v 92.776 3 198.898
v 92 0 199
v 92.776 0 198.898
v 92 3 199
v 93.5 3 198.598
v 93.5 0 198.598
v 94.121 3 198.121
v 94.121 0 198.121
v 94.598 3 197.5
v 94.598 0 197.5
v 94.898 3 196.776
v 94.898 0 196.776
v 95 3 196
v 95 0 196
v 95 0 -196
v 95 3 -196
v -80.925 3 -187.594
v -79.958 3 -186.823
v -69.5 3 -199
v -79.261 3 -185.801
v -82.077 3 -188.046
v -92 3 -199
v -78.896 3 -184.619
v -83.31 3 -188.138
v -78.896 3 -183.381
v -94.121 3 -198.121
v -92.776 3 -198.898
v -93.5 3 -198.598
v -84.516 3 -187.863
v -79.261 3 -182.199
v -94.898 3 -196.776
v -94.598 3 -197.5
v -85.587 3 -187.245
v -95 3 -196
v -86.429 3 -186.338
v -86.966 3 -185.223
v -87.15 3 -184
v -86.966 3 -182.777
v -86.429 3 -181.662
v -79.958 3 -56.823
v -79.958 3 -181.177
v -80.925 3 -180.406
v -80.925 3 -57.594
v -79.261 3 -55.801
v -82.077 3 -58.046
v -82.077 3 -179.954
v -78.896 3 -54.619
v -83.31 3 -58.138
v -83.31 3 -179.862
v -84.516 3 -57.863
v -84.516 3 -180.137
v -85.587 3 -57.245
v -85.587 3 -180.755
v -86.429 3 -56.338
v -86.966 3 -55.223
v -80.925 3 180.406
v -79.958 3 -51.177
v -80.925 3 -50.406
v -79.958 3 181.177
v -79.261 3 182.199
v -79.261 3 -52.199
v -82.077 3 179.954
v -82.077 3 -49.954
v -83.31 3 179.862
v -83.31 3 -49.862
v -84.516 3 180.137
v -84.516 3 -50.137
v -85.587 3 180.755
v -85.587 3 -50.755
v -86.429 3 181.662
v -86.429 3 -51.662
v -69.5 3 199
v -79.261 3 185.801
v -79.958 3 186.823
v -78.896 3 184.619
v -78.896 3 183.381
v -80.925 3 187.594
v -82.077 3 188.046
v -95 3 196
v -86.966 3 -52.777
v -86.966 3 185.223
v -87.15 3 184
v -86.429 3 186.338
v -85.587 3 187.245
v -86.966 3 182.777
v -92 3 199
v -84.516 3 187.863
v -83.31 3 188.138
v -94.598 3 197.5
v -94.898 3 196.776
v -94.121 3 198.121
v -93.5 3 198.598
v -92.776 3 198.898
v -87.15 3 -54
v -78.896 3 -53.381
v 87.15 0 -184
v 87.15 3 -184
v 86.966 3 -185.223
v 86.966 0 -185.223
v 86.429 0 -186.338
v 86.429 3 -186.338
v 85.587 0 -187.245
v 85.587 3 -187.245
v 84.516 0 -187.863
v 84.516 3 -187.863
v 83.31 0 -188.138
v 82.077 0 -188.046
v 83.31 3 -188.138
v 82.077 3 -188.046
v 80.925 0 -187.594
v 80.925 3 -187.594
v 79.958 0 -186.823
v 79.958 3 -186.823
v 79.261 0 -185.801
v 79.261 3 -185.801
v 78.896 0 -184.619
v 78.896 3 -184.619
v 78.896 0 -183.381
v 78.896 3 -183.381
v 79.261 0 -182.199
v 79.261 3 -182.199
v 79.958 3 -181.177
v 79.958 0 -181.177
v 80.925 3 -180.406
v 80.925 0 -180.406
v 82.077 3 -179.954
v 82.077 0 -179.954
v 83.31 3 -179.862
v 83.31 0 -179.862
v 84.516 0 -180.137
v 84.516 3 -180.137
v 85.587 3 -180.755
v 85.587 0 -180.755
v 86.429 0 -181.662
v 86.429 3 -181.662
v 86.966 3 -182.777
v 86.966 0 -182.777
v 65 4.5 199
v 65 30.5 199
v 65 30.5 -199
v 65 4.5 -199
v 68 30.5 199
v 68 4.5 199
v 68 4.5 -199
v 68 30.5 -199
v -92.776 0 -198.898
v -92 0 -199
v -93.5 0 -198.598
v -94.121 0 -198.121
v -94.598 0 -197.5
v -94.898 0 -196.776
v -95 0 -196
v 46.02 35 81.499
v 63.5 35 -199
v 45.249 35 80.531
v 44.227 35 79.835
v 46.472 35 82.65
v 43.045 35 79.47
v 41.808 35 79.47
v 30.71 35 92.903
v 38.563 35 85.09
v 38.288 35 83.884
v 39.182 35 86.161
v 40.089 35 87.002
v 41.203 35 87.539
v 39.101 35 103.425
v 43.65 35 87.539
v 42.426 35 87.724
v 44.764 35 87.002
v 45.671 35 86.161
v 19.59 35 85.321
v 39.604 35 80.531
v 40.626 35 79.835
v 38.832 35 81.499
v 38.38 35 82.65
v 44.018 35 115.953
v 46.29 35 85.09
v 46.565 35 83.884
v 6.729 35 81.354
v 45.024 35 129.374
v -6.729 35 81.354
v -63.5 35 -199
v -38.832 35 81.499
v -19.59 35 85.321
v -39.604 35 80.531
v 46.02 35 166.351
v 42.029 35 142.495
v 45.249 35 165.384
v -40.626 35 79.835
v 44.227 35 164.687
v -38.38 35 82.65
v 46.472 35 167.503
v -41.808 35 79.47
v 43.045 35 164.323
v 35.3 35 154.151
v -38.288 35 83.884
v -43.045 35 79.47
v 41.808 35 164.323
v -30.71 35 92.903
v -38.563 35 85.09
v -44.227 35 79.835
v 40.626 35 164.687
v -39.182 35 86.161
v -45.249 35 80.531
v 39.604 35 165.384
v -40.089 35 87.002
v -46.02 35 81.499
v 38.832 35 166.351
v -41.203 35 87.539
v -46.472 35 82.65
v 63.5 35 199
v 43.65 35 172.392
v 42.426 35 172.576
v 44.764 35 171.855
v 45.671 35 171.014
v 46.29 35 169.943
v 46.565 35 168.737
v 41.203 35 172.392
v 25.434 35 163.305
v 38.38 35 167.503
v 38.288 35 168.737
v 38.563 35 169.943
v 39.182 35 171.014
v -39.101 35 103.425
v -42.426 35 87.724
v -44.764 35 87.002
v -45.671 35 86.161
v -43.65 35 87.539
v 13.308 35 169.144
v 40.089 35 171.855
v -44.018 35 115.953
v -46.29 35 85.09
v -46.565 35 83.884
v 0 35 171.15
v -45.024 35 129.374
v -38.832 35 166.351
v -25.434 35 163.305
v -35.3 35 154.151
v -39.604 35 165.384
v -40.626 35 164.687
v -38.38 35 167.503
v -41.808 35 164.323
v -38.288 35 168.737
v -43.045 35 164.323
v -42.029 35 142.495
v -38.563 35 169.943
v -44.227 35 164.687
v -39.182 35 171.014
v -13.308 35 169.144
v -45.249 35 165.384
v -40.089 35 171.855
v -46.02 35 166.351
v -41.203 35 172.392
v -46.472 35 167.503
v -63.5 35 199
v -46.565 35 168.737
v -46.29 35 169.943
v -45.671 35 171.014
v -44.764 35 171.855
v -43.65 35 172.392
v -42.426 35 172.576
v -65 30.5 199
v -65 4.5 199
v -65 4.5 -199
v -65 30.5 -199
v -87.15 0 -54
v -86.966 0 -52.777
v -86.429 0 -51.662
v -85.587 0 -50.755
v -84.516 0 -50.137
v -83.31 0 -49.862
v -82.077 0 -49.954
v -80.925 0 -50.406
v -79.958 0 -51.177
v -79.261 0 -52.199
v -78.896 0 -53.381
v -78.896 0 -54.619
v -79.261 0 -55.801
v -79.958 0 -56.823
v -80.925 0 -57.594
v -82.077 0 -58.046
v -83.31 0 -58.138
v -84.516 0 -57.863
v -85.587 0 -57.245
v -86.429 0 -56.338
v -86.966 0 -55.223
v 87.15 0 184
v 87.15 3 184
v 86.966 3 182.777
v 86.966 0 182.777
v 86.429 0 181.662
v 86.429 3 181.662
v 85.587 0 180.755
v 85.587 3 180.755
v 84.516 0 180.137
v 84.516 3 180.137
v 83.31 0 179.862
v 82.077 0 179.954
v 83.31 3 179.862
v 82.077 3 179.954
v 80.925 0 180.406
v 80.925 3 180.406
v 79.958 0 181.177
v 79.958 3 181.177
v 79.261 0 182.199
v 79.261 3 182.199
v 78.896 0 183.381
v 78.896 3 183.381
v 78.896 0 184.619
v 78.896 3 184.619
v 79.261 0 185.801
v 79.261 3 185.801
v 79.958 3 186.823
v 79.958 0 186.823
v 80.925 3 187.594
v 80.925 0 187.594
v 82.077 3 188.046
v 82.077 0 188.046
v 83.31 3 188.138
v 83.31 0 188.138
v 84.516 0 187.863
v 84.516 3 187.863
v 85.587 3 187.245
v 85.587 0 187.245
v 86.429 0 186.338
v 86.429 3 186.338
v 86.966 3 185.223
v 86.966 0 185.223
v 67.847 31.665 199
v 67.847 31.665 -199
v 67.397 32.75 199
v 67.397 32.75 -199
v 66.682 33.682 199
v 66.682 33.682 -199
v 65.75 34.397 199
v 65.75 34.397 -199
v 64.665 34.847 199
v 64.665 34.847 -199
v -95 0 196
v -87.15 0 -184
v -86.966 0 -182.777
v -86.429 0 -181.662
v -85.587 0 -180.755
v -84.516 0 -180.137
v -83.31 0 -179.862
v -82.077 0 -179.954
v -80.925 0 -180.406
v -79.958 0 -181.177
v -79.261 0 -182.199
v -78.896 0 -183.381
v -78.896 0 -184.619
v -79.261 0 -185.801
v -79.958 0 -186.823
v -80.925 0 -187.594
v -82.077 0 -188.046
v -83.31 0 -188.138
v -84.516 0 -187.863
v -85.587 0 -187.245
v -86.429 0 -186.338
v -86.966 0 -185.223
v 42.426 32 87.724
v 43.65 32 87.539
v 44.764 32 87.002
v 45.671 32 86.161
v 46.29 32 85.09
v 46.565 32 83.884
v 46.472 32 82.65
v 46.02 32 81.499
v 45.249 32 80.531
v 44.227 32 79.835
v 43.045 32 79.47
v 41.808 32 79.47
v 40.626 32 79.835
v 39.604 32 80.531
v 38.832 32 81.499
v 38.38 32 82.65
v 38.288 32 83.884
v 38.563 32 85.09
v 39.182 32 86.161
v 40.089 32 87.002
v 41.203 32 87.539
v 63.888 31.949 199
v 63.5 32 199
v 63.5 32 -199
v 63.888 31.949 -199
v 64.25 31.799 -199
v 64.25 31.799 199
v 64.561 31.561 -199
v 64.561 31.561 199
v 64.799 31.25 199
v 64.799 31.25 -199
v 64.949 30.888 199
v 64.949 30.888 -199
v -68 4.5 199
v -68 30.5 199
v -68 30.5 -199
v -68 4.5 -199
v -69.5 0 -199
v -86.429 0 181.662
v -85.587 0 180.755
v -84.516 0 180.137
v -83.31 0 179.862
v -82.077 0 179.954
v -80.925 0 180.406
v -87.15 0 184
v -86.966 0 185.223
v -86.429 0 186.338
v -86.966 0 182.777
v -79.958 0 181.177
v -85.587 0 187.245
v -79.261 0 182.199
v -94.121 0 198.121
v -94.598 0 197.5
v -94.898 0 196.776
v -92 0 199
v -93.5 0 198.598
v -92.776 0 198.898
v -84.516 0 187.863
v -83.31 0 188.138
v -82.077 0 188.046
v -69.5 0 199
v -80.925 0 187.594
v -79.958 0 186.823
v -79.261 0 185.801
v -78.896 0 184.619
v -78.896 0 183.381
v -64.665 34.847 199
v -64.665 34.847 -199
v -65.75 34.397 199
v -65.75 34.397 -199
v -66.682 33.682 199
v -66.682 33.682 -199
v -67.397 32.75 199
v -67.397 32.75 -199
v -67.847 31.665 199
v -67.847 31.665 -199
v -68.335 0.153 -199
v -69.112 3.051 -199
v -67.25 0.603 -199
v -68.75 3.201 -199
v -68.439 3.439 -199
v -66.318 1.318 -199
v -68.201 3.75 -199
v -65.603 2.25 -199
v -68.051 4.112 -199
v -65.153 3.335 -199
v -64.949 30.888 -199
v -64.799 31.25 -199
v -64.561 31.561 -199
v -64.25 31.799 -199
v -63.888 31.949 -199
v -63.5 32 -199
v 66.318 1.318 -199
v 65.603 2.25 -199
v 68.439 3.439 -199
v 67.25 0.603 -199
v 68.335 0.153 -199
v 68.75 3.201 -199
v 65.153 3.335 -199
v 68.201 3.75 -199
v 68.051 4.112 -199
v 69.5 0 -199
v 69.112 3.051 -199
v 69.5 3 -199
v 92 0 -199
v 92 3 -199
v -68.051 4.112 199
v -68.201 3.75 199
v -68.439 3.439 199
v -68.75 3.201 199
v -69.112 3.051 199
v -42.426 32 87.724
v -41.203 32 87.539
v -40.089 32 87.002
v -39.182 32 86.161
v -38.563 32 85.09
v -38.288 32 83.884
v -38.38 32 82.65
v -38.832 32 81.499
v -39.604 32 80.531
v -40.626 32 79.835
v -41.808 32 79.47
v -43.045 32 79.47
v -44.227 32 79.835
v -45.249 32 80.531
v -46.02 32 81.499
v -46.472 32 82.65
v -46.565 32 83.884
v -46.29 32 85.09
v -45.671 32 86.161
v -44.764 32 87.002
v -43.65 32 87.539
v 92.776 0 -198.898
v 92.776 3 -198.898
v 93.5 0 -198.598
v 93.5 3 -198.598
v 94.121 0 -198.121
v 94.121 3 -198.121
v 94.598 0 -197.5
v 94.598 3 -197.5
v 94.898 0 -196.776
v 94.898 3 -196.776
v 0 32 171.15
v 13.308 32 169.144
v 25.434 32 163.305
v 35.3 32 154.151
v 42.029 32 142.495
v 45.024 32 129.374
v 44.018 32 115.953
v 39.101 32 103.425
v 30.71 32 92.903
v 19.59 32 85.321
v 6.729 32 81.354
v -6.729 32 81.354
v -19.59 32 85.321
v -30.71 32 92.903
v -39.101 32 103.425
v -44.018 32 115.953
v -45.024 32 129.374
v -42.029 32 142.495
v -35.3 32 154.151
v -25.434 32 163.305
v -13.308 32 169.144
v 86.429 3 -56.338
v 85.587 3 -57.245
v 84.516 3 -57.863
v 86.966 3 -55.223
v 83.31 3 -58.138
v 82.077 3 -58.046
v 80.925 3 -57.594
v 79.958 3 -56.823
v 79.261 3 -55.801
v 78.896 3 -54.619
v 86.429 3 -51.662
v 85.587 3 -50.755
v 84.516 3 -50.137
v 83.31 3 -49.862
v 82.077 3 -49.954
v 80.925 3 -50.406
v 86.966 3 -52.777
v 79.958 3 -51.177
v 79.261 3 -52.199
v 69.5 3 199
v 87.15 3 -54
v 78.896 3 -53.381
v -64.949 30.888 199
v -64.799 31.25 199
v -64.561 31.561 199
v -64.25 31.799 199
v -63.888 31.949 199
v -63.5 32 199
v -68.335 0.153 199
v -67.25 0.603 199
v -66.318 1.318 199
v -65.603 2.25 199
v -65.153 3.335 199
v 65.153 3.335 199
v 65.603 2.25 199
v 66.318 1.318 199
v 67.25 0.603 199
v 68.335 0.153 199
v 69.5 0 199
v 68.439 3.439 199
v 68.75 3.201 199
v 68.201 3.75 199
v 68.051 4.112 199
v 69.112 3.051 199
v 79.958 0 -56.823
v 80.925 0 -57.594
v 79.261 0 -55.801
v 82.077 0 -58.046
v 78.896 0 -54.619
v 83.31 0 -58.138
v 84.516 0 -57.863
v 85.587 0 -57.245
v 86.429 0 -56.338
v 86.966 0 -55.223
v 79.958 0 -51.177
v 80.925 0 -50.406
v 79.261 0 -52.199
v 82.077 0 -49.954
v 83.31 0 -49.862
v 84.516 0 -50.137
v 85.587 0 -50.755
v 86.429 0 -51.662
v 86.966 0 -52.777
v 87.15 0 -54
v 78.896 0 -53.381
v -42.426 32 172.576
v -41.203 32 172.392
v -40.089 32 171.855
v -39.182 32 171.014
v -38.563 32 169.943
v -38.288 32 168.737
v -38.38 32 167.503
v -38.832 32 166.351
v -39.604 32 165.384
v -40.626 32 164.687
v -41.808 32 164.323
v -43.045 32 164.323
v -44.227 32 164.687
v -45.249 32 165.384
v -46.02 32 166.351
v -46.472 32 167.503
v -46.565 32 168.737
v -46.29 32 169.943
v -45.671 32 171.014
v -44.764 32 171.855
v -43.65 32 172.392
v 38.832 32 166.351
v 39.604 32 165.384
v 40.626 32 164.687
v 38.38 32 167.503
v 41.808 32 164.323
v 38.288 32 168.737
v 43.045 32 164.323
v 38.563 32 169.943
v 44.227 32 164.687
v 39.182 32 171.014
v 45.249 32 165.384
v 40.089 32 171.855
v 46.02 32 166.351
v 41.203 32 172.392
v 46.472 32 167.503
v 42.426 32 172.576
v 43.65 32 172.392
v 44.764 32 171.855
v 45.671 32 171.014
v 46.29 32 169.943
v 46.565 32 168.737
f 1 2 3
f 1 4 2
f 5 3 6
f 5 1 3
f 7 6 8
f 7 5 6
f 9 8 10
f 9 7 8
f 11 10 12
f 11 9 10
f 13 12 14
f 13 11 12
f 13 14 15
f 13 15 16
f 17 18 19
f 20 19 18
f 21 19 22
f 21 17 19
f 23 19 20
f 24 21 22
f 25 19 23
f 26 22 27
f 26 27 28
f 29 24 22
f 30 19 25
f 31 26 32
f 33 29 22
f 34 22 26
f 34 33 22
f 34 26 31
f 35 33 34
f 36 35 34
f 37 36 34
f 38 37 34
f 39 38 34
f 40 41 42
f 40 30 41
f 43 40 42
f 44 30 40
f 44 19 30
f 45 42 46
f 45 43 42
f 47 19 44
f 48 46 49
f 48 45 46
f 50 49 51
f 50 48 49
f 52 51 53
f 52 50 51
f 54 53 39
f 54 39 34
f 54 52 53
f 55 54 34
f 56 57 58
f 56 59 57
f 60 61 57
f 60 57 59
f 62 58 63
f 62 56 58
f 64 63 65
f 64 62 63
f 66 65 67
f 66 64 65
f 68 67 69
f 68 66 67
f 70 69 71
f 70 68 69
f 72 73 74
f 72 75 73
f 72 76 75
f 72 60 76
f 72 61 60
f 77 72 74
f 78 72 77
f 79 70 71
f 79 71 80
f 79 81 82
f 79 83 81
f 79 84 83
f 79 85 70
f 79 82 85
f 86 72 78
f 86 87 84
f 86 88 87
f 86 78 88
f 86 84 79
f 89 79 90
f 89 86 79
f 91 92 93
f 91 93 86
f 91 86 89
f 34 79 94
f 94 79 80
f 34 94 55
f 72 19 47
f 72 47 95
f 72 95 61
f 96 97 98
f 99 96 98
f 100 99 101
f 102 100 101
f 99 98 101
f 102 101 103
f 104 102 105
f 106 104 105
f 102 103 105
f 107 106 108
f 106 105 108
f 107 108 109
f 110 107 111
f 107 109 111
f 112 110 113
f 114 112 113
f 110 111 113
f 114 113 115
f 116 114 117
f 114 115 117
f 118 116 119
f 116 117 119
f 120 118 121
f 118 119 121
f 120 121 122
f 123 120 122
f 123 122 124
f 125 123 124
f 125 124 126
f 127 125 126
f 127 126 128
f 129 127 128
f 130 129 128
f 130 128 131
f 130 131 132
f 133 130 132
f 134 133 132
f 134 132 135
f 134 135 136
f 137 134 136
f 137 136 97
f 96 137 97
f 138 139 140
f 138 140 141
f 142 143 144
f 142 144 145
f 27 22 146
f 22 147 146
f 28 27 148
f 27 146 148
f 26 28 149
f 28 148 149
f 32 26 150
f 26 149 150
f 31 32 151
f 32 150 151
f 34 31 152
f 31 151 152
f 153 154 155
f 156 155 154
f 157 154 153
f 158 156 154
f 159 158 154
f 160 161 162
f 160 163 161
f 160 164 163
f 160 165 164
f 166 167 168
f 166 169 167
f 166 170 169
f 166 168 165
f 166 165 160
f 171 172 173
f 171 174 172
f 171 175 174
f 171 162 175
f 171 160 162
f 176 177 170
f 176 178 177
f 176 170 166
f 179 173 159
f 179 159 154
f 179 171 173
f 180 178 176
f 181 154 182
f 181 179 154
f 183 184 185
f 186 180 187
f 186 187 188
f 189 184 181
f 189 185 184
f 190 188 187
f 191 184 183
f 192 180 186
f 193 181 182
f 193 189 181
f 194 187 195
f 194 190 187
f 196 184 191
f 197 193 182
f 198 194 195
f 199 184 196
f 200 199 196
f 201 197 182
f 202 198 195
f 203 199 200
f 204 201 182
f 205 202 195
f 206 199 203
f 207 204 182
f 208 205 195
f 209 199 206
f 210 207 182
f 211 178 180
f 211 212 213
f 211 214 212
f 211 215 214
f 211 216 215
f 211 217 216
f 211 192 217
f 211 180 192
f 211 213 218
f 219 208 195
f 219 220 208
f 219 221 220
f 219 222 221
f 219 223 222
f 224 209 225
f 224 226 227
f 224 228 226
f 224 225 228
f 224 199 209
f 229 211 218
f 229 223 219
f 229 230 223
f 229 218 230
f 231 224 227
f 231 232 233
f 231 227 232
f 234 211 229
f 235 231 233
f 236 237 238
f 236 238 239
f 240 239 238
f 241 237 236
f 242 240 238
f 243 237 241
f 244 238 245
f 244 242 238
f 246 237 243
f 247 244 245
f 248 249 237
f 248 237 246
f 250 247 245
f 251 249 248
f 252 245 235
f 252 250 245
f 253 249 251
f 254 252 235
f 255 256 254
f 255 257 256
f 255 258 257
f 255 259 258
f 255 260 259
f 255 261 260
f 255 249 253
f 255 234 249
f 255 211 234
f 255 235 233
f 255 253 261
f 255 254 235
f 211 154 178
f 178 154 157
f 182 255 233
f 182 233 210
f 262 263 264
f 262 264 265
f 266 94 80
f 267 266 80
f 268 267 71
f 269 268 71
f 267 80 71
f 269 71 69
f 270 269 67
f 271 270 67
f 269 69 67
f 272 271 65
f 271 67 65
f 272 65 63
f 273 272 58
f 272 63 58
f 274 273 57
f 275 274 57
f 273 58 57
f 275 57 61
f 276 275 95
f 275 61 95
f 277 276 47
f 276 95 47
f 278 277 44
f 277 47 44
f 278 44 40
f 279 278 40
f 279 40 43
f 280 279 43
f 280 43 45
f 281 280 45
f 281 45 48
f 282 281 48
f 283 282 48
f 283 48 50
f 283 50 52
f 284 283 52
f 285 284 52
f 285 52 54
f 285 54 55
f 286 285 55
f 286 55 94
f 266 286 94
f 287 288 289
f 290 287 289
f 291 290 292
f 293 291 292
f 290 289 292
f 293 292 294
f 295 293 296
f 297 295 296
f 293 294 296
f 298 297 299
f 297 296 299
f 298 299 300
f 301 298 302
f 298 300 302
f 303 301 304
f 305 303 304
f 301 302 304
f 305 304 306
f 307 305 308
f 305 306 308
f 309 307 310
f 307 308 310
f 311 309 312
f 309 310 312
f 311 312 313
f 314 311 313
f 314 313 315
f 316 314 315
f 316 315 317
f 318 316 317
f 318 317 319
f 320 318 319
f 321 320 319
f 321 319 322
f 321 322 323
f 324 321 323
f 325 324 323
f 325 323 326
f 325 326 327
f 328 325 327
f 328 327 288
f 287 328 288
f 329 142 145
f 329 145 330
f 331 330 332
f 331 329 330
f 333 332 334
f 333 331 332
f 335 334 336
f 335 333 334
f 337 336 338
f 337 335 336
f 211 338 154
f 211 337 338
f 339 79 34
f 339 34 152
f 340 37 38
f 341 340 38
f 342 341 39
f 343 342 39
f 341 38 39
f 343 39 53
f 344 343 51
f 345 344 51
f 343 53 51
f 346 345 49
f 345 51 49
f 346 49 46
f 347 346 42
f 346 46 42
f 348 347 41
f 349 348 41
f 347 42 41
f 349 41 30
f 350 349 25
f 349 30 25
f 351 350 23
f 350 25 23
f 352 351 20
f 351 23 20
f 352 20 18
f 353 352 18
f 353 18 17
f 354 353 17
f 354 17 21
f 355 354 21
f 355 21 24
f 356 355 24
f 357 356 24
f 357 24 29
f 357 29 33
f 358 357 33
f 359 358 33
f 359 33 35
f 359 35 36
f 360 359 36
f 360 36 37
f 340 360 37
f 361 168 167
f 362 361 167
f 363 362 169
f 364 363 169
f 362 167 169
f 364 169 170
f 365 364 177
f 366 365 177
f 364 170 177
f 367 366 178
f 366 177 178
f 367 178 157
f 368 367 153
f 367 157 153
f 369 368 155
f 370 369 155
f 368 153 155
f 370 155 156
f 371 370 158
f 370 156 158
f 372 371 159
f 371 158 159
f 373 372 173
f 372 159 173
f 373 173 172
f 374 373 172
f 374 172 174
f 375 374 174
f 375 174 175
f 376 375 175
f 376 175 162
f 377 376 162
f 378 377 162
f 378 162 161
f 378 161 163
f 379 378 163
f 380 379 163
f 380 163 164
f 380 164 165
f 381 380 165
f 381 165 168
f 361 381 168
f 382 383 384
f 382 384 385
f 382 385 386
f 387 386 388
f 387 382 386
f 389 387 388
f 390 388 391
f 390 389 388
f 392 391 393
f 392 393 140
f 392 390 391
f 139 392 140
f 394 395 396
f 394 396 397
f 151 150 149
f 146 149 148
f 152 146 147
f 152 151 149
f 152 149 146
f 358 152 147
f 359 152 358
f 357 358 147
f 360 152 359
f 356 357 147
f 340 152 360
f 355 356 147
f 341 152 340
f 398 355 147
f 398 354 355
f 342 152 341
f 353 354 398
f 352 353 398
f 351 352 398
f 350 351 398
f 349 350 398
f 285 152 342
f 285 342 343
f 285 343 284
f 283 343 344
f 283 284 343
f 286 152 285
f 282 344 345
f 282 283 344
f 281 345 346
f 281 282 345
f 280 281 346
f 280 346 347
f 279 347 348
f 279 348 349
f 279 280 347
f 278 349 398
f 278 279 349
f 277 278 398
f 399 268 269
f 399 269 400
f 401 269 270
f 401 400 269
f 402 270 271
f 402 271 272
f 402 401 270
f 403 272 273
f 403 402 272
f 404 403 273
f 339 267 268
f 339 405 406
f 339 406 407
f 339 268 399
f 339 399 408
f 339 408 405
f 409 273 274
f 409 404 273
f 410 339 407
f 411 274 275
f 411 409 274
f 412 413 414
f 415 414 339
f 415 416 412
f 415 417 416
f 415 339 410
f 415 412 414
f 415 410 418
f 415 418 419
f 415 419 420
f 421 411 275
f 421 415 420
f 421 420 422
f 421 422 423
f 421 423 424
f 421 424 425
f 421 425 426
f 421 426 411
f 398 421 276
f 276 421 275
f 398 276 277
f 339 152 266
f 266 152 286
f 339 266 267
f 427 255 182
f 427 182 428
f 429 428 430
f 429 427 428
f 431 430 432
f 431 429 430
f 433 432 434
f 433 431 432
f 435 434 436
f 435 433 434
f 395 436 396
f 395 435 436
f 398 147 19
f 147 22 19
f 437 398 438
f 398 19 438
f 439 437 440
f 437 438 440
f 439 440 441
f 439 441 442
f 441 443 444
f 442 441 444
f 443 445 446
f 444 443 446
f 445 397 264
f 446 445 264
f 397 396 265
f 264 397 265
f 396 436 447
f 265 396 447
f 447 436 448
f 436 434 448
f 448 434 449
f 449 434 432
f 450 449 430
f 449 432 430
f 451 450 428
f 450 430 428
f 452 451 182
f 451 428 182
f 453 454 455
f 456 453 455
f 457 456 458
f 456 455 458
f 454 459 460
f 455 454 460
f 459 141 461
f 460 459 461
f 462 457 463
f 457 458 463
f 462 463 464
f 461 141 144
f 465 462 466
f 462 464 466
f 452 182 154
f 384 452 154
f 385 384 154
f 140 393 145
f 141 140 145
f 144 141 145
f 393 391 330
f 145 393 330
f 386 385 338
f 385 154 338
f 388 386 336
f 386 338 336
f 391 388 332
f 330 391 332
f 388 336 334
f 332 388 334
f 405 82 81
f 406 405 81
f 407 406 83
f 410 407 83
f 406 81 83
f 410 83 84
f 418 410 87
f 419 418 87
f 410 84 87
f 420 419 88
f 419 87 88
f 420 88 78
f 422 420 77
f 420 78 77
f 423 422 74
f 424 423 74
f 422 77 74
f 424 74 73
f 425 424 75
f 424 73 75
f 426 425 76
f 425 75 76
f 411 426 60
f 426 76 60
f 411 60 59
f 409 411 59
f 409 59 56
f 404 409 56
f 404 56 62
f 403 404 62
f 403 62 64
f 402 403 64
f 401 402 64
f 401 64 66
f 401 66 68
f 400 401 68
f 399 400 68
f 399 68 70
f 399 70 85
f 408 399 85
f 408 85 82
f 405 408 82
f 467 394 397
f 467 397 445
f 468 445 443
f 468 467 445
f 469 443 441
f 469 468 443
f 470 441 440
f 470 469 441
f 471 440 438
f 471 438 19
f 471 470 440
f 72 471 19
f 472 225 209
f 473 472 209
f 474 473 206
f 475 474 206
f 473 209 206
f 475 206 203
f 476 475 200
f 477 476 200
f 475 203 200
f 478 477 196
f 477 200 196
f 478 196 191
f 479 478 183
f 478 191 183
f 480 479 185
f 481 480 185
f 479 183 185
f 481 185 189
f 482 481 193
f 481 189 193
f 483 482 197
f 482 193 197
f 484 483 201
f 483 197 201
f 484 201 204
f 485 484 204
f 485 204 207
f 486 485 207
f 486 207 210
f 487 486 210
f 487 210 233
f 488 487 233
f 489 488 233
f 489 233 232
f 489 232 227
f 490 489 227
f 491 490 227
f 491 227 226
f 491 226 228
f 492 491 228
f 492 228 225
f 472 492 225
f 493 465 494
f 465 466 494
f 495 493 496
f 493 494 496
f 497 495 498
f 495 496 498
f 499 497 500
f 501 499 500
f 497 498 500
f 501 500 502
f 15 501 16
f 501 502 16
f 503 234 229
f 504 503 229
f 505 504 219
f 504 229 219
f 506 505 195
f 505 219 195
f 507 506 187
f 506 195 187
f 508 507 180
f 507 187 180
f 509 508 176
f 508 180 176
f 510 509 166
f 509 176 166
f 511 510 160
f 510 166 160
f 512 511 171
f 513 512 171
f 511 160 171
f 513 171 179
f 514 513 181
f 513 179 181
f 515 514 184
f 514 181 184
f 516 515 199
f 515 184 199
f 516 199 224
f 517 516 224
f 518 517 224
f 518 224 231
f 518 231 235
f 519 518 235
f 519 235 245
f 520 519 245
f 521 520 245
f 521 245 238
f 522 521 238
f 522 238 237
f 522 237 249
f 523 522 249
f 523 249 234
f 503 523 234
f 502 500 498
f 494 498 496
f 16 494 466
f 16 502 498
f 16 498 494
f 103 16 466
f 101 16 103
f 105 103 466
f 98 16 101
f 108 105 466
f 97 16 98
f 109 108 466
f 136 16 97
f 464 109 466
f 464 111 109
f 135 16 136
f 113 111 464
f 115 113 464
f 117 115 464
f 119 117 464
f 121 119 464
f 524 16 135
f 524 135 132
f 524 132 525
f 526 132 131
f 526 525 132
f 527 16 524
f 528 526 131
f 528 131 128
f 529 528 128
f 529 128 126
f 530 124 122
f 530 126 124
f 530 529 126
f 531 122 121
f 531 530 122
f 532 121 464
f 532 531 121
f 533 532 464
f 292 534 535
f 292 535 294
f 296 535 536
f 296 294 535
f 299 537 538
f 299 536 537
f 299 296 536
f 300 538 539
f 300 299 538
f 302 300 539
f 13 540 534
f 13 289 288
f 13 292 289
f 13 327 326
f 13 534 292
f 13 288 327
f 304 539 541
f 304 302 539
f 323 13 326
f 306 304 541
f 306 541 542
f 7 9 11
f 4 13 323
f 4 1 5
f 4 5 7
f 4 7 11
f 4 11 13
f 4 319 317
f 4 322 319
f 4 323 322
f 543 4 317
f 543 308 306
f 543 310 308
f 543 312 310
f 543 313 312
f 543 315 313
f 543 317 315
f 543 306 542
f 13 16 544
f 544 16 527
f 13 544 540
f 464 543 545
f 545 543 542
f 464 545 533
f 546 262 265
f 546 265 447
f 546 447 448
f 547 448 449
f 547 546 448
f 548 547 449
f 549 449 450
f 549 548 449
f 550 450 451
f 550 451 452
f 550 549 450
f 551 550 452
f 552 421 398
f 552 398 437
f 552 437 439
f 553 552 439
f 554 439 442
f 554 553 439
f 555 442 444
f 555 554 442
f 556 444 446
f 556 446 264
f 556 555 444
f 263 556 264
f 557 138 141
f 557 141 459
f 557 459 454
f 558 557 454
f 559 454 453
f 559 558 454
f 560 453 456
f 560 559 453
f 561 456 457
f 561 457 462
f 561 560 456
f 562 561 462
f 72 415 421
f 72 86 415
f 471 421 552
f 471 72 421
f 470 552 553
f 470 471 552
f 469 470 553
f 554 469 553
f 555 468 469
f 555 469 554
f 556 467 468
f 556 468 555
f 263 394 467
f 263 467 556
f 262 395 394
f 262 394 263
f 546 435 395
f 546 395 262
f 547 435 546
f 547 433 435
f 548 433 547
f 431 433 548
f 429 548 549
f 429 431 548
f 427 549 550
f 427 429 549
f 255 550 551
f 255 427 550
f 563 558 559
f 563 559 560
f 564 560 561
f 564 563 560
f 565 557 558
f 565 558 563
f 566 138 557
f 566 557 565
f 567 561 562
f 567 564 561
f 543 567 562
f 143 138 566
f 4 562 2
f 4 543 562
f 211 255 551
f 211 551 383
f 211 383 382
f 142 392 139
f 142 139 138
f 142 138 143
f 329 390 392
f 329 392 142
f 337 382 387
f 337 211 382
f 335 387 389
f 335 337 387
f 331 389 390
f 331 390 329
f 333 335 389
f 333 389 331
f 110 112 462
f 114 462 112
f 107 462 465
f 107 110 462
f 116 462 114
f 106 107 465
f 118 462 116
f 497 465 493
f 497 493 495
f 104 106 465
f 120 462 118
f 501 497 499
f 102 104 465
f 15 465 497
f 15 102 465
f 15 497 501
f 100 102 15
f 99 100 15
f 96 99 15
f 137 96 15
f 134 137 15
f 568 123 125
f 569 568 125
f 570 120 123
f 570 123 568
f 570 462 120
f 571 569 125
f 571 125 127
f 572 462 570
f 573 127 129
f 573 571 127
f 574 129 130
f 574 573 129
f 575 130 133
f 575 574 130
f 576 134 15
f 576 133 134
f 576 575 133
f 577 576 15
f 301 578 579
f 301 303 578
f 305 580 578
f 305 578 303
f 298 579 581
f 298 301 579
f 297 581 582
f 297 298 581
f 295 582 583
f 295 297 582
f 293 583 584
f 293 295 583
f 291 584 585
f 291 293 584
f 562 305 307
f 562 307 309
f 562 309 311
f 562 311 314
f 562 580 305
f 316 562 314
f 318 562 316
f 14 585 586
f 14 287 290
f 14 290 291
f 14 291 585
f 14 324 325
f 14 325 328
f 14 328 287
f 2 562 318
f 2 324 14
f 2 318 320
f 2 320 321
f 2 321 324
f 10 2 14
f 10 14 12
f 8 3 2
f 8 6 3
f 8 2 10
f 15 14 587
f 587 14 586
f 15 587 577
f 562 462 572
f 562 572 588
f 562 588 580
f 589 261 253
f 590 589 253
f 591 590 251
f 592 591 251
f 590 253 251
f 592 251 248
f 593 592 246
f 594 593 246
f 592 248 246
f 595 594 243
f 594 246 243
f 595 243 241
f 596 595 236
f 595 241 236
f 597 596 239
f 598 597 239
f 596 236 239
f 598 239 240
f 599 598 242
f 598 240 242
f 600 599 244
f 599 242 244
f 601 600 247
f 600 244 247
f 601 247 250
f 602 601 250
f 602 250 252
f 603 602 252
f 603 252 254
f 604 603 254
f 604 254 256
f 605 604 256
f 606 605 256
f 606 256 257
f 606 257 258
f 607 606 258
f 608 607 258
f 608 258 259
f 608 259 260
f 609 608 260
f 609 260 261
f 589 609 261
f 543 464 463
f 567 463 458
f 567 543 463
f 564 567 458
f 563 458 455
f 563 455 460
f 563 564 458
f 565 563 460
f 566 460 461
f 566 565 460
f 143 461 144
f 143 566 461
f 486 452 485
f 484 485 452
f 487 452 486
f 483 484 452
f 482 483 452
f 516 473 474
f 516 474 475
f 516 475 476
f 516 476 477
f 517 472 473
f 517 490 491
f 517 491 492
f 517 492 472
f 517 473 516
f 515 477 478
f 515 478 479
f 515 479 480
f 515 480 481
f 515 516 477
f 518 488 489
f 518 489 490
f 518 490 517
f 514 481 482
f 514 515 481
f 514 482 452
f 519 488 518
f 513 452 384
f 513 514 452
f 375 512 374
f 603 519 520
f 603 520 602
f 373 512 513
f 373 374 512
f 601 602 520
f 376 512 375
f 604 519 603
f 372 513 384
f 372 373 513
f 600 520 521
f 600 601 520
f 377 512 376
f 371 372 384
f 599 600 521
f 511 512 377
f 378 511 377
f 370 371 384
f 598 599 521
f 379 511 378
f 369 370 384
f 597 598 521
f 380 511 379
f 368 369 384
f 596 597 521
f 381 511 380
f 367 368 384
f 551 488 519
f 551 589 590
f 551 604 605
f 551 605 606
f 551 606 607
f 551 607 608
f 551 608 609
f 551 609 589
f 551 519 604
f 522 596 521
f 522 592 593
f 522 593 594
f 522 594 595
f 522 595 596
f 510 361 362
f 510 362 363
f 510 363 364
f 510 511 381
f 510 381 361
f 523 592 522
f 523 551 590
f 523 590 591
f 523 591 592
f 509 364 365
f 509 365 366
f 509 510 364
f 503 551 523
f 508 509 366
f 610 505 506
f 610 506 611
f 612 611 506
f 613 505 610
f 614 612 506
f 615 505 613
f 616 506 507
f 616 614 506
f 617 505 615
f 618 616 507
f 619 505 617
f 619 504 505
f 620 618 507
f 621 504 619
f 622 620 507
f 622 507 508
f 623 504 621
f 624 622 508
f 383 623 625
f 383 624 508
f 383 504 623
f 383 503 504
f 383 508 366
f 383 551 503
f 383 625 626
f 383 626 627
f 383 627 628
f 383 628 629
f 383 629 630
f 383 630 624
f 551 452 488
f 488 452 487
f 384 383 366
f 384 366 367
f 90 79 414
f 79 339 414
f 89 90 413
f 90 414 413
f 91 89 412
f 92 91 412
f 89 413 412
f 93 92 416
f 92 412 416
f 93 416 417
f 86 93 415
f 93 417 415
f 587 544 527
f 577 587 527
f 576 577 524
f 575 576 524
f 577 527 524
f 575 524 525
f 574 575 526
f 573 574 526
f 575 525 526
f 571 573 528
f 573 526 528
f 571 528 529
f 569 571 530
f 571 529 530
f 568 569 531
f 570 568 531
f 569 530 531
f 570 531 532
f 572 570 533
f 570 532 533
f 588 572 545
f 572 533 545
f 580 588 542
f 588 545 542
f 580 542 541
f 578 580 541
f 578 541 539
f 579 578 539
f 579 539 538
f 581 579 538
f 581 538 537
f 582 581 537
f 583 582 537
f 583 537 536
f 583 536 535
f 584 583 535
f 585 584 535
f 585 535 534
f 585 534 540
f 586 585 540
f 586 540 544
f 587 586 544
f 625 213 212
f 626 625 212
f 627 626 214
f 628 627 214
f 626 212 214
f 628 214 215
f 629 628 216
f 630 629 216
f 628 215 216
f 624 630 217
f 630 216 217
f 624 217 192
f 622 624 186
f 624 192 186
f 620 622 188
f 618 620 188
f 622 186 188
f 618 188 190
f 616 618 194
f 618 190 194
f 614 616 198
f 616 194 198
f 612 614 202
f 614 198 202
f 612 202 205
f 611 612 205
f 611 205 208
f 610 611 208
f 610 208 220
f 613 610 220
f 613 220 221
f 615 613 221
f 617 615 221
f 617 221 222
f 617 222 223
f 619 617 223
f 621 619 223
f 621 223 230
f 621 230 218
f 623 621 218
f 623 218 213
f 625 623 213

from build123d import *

# Parameters (mm, degrees)
BASE_FLANGE1_DEPTH = 199
CUT_EXTRUDE1_REACH = 224.823
SKETCH6_R          = 4.15
FILLET1_R          = 3
CUT_EXTRUDE2_REACH = 225.273
SKETCH8_R          = 45.15
SKETCH8_R_2        = 4.15


# Sheet-metal steps are written as plain solids
with BuildPart() as part:
    # Sketch1 → Base-Flange1 (new, symmetric)
    with BuildSketch(Plane.XY):
        with BuildLine():
            Line((-95, 0), (-69.5, 0))
            ThreePointArc((-69.5, 0), (-66.318019485, 1.318019485), (-65, 4.5))
            Line((-65, 4.5), (-65, 30.5))
            ThreePointArc((-65, 30.5), (-64.560660172, 31.560660172), (-63.5, 32))
            Line((-63.5, 32), (63.5, 32))
            ThreePointArc((63.5, 32), (64.560660172, 31.560660172), (65, 30.5))
            Line((65, 30.5), (65, 4.5))
            ThreePointArc((65, 4.5), (66.318019485, 1.318019485), (69.5, 0))
            Line((69.5, 0), (95, 0))
            Line((95, 0), (95, 3))
            Line((95, 3), (69.5, 3))
            ThreePointArc((69.5, 3), (68.439339828, 3.439339828), (68, 4.5))
            Line((68, 4.5), (68, 30.5))
            ThreePointArc((68, 30.5), (66.681980515, 33.681980515), (63.5, 35))
            Line((63.5, 35), (-63.5, 35))
            ThreePointArc((-63.5, 35), (-66.681980515, 33.681980515), (-68, 30.5))
            Line((-68, 30.5), (-68, 4.5))
            ThreePointArc((-68, 4.5), (-68.439339828, 3.439339828), (-69.5, 3))
            Line((-69.5, 3), (-95, 3))
            Line((-95, 3), (-95, 0))
        make_face()
    extrude(amount=BASE_FLANGE1_DEPTH, both=True)

    # Sketch6 → Cut-Extrude1 (cut, up to next)
    with BuildSketch(Plane(origin=(0, 3, 0), x_dir=(1, 0, 0), z_dir=(0, 1, 0)), mode=Mode.PRIVATE) as cut_extrude1_sk1:
        with Locations(Location((-83, -184, 0), (0, 0, 180))):
            Circle(SKETCH6_R)
    cut_extrude1_tool1 = extrude(cut_extrude1_sk1.sketch, amount=-CUT_EXTRUDE1_REACH, mode=Mode.PRIVATE) & part.part
    # Sketch6 → Cut-Extrude1 (cut, up to next)
    with BuildSketch(Plane(origin=(0, 3, 0), x_dir=(1, 0, 0), z_dir=(0, 1, 0)), mode=Mode.PRIVATE) as cut_extrude1_sk2:
        with Locations(Location((-83, 54, 0), (0, 0, 180))):
            Circle(SKETCH6_R)
    cut_extrude1_tool2 = extrude(cut_extrude1_sk2.sketch, amount=-CUT_EXTRUDE1_REACH, mode=Mode.PRIVATE) & part.part
    # Sketch6 → Cut-Extrude1 (cut, up to next)
    with BuildSketch(Plane(origin=(0, 3, 0), x_dir=(1, 0, 0), z_dir=(0, 1, 0)), mode=Mode.PRIVATE) as cut_extrude1_sk3:
        with Locations(Location((-83, 184, 0), (0, 0, 180))):
            Circle(SKETCH6_R)
    cut_extrude1_tool3 = extrude(cut_extrude1_sk3.sketch, amount=-CUT_EXTRUDE1_REACH, mode=Mode.PRIVATE) & part.part
    # Sketch6 → Cut-Extrude1 (cut, up to next)
    with BuildSketch(Plane(origin=(0, 3, 0), x_dir=(1, 0, 0), z_dir=(0, 1, 0)), mode=Mode.PRIVATE) as cut_extrude1_sk4:
        with Locations((83, 184)):
            Circle(SKETCH6_R)
    cut_extrude1_tool4 = extrude(cut_extrude1_sk4.sketch, amount=-CUT_EXTRUDE1_REACH, mode=Mode.PRIVATE) & part.part
    # Sketch6 → Cut-Extrude1 (cut, up to next)
    with BuildSketch(Plane(origin=(0, 3, 0), x_dir=(1, 0, 0), z_dir=(0, 1, 0)), mode=Mode.PRIVATE) as cut_extrude1_sk5:
        with Locations((83, 54)):
            Circle(SKETCH6_R)
    cut_extrude1_tool5 = extrude(cut_extrude1_sk5.sketch, amount=-CUT_EXTRUDE1_REACH, mode=Mode.PRIVATE) & part.part
    # Sketch6 → Cut-Extrude1 (cut, up to next)
    with BuildSketch(Plane(origin=(0, 3, 0), x_dir=(1, 0, 0), z_dir=(0, 1, 0)), mode=Mode.PRIVATE) as cut_extrude1_sk6:
        with Locations((83, -184)):
            Circle(SKETCH6_R)
    cut_extrude1_tool6 = extrude(cut_extrude1_sk6.sketch, amount=-CUT_EXTRUDE1_REACH, mode=Mode.PRIVATE) & part.part
    add(cut_extrude1_tool1.solids().sort_by_distance((-83, 3, 184))[0], mode=Mode.SUBTRACT)
    add(cut_extrude1_tool2.solids().sort_by_distance((-83, 3, -54))[0], mode=Mode.SUBTRACT)
    add(cut_extrude1_tool3.solids().sort_by_distance((-83, 3, -184))[0], mode=Mode.SUBTRACT)
    add(cut_extrude1_tool4.solids().sort_by_distance((83, 3, -184))[0], mode=Mode.SUBTRACT)
    add(cut_extrude1_tool5.solids().sort_by_distance((83, 3, -54))[0], mode=Mode.SUBTRACT)
    add(cut_extrude1_tool6.solids().sort_by_distance((83, 3, 184))[0], mode=Mode.SUBTRACT)

    # Fillet1
    fillet1_edges = [part.edges().sort_by_distance(p)[0] for p in [
        (95, 1.5, -199),
        (-95, 1.5, -199),
        (95, 1.5, 199),
        (-95, 1.5, 199),
    ]]
    fillet(fillet1_edges, radius=FILLET1_R)

    # Sketch8 → Cut-Extrude2 (cut, up to next)
    with BuildSketch(Plane(origin=(0, 35, 0), x_dir=(1, 0, 0), z_dir=(0, 1, 0)), mode=Mode.PRIVATE) as cut_extrude2_sk1:
        with Locations(Location((0, -126, 0), (0, 0, 270))):
            Circle(SKETCH8_R)
    cut_extrude2_tool1 = extrude(cut_extrude2_sk1.sketch, amount=-CUT_EXTRUDE2_REACH, mode=Mode.PRIVATE) & part.part
    # Sketch8 → Cut-Extrude2 (cut, up to next)
    with BuildSketch(Plane(origin=(0, 35, 0), x_dir=(1, 0, 0), z_dir=(0, 1, 0)), mode=Mode.PRIVATE) as cut_extrude2_sk2:
        with Locations(Location((-42.426406871, -83.573593129, 0), (0, 0, 270))):
            Circle(SKETCH8_R_2)
    cut_extrude2_tool2 = extrude(cut_extrude2_sk2.sketch, amount=-CUT_EXTRUDE2_REACH, mode=Mode.PRIVATE) & part.part
    # Sketch8 → Cut-Extrude2 (cut, up to next)
    with BuildSketch(Plane(origin=(0, 35, 0), x_dir=(1, 0, 0), z_dir=(0, 1, 0)), mode=Mode.PRIVATE) as cut_extrude2_sk3:
        with Locations(Location((42.426406871, -83.573593129, 0), (0, 0, 270))):
            Circle(SKETCH8_R_2)
    cut_extrude2_tool3 = extrude(cut_extrude2_sk3.sketch, amount=-CUT_EXTRUDE2_REACH, mode=Mode.PRIVATE) & part.part
    # Sketch8 → Cut-Extrude2 (cut, up to next)
    with BuildSketch(Plane(origin=(0, 35, 0), x_dir=(1, 0, 0), z_dir=(0, 1, 0)), mode=Mode.PRIVATE) as cut_extrude2_sk4:
        with Locations(Location((42.426406871, -168.426406871, 0), (0, 0, 270))):
            Circle(SKETCH8_R_2)
    cut_extrude2_tool4 = extrude(cut_extrude2_sk4.sketch, amount=-CUT_EXTRUDE2_REACH, mode=Mode.PRIVATE) & part.part
    # Sketch8 → Cut-Extrude2 (cut, up to next)
    with BuildSketch(Plane(origin=(0, 35, 0), x_dir=(1, 0, 0), z_dir=(0, 1, 0)), mode=Mode.PRIVATE) as cut_extrude2_sk5:
        with Locations(Location((-42.426406871, -168.426406871, 0), (0, 0, 270))):
            Circle(SKETCH8_R_2)
    cut_extrude2_tool5 = extrude(cut_extrude2_sk5.sketch, amount=-CUT_EXTRUDE2_REACH, mode=Mode.PRIVATE) & part.part
    add(cut_extrude2_tool1.solids().sort_by_distance((0, 35, 126))[0], mode=Mode.SUBTRACT)
    add(cut_extrude2_tool2.solids().sort_by_distance((-42.426407, 35, 83.573593))[0], mode=Mode.SUBTRACT)
    add(cut_extrude2_tool3.solids().sort_by_distance((42.426407, 35, 83.573593))[0], mode=Mode.SUBTRACT)
    add(cut_extrude2_tool4.solids().sort_by_distance((42.426407, 35, 168.426407))[0], mode=Mode.SUBTRACT)
    add(cut_extrude2_tool5.solids().sort_by_distance((-42.426407, 35, 168.426407))[0], mode=Mode.SUBTRACT)


solid = part.part
